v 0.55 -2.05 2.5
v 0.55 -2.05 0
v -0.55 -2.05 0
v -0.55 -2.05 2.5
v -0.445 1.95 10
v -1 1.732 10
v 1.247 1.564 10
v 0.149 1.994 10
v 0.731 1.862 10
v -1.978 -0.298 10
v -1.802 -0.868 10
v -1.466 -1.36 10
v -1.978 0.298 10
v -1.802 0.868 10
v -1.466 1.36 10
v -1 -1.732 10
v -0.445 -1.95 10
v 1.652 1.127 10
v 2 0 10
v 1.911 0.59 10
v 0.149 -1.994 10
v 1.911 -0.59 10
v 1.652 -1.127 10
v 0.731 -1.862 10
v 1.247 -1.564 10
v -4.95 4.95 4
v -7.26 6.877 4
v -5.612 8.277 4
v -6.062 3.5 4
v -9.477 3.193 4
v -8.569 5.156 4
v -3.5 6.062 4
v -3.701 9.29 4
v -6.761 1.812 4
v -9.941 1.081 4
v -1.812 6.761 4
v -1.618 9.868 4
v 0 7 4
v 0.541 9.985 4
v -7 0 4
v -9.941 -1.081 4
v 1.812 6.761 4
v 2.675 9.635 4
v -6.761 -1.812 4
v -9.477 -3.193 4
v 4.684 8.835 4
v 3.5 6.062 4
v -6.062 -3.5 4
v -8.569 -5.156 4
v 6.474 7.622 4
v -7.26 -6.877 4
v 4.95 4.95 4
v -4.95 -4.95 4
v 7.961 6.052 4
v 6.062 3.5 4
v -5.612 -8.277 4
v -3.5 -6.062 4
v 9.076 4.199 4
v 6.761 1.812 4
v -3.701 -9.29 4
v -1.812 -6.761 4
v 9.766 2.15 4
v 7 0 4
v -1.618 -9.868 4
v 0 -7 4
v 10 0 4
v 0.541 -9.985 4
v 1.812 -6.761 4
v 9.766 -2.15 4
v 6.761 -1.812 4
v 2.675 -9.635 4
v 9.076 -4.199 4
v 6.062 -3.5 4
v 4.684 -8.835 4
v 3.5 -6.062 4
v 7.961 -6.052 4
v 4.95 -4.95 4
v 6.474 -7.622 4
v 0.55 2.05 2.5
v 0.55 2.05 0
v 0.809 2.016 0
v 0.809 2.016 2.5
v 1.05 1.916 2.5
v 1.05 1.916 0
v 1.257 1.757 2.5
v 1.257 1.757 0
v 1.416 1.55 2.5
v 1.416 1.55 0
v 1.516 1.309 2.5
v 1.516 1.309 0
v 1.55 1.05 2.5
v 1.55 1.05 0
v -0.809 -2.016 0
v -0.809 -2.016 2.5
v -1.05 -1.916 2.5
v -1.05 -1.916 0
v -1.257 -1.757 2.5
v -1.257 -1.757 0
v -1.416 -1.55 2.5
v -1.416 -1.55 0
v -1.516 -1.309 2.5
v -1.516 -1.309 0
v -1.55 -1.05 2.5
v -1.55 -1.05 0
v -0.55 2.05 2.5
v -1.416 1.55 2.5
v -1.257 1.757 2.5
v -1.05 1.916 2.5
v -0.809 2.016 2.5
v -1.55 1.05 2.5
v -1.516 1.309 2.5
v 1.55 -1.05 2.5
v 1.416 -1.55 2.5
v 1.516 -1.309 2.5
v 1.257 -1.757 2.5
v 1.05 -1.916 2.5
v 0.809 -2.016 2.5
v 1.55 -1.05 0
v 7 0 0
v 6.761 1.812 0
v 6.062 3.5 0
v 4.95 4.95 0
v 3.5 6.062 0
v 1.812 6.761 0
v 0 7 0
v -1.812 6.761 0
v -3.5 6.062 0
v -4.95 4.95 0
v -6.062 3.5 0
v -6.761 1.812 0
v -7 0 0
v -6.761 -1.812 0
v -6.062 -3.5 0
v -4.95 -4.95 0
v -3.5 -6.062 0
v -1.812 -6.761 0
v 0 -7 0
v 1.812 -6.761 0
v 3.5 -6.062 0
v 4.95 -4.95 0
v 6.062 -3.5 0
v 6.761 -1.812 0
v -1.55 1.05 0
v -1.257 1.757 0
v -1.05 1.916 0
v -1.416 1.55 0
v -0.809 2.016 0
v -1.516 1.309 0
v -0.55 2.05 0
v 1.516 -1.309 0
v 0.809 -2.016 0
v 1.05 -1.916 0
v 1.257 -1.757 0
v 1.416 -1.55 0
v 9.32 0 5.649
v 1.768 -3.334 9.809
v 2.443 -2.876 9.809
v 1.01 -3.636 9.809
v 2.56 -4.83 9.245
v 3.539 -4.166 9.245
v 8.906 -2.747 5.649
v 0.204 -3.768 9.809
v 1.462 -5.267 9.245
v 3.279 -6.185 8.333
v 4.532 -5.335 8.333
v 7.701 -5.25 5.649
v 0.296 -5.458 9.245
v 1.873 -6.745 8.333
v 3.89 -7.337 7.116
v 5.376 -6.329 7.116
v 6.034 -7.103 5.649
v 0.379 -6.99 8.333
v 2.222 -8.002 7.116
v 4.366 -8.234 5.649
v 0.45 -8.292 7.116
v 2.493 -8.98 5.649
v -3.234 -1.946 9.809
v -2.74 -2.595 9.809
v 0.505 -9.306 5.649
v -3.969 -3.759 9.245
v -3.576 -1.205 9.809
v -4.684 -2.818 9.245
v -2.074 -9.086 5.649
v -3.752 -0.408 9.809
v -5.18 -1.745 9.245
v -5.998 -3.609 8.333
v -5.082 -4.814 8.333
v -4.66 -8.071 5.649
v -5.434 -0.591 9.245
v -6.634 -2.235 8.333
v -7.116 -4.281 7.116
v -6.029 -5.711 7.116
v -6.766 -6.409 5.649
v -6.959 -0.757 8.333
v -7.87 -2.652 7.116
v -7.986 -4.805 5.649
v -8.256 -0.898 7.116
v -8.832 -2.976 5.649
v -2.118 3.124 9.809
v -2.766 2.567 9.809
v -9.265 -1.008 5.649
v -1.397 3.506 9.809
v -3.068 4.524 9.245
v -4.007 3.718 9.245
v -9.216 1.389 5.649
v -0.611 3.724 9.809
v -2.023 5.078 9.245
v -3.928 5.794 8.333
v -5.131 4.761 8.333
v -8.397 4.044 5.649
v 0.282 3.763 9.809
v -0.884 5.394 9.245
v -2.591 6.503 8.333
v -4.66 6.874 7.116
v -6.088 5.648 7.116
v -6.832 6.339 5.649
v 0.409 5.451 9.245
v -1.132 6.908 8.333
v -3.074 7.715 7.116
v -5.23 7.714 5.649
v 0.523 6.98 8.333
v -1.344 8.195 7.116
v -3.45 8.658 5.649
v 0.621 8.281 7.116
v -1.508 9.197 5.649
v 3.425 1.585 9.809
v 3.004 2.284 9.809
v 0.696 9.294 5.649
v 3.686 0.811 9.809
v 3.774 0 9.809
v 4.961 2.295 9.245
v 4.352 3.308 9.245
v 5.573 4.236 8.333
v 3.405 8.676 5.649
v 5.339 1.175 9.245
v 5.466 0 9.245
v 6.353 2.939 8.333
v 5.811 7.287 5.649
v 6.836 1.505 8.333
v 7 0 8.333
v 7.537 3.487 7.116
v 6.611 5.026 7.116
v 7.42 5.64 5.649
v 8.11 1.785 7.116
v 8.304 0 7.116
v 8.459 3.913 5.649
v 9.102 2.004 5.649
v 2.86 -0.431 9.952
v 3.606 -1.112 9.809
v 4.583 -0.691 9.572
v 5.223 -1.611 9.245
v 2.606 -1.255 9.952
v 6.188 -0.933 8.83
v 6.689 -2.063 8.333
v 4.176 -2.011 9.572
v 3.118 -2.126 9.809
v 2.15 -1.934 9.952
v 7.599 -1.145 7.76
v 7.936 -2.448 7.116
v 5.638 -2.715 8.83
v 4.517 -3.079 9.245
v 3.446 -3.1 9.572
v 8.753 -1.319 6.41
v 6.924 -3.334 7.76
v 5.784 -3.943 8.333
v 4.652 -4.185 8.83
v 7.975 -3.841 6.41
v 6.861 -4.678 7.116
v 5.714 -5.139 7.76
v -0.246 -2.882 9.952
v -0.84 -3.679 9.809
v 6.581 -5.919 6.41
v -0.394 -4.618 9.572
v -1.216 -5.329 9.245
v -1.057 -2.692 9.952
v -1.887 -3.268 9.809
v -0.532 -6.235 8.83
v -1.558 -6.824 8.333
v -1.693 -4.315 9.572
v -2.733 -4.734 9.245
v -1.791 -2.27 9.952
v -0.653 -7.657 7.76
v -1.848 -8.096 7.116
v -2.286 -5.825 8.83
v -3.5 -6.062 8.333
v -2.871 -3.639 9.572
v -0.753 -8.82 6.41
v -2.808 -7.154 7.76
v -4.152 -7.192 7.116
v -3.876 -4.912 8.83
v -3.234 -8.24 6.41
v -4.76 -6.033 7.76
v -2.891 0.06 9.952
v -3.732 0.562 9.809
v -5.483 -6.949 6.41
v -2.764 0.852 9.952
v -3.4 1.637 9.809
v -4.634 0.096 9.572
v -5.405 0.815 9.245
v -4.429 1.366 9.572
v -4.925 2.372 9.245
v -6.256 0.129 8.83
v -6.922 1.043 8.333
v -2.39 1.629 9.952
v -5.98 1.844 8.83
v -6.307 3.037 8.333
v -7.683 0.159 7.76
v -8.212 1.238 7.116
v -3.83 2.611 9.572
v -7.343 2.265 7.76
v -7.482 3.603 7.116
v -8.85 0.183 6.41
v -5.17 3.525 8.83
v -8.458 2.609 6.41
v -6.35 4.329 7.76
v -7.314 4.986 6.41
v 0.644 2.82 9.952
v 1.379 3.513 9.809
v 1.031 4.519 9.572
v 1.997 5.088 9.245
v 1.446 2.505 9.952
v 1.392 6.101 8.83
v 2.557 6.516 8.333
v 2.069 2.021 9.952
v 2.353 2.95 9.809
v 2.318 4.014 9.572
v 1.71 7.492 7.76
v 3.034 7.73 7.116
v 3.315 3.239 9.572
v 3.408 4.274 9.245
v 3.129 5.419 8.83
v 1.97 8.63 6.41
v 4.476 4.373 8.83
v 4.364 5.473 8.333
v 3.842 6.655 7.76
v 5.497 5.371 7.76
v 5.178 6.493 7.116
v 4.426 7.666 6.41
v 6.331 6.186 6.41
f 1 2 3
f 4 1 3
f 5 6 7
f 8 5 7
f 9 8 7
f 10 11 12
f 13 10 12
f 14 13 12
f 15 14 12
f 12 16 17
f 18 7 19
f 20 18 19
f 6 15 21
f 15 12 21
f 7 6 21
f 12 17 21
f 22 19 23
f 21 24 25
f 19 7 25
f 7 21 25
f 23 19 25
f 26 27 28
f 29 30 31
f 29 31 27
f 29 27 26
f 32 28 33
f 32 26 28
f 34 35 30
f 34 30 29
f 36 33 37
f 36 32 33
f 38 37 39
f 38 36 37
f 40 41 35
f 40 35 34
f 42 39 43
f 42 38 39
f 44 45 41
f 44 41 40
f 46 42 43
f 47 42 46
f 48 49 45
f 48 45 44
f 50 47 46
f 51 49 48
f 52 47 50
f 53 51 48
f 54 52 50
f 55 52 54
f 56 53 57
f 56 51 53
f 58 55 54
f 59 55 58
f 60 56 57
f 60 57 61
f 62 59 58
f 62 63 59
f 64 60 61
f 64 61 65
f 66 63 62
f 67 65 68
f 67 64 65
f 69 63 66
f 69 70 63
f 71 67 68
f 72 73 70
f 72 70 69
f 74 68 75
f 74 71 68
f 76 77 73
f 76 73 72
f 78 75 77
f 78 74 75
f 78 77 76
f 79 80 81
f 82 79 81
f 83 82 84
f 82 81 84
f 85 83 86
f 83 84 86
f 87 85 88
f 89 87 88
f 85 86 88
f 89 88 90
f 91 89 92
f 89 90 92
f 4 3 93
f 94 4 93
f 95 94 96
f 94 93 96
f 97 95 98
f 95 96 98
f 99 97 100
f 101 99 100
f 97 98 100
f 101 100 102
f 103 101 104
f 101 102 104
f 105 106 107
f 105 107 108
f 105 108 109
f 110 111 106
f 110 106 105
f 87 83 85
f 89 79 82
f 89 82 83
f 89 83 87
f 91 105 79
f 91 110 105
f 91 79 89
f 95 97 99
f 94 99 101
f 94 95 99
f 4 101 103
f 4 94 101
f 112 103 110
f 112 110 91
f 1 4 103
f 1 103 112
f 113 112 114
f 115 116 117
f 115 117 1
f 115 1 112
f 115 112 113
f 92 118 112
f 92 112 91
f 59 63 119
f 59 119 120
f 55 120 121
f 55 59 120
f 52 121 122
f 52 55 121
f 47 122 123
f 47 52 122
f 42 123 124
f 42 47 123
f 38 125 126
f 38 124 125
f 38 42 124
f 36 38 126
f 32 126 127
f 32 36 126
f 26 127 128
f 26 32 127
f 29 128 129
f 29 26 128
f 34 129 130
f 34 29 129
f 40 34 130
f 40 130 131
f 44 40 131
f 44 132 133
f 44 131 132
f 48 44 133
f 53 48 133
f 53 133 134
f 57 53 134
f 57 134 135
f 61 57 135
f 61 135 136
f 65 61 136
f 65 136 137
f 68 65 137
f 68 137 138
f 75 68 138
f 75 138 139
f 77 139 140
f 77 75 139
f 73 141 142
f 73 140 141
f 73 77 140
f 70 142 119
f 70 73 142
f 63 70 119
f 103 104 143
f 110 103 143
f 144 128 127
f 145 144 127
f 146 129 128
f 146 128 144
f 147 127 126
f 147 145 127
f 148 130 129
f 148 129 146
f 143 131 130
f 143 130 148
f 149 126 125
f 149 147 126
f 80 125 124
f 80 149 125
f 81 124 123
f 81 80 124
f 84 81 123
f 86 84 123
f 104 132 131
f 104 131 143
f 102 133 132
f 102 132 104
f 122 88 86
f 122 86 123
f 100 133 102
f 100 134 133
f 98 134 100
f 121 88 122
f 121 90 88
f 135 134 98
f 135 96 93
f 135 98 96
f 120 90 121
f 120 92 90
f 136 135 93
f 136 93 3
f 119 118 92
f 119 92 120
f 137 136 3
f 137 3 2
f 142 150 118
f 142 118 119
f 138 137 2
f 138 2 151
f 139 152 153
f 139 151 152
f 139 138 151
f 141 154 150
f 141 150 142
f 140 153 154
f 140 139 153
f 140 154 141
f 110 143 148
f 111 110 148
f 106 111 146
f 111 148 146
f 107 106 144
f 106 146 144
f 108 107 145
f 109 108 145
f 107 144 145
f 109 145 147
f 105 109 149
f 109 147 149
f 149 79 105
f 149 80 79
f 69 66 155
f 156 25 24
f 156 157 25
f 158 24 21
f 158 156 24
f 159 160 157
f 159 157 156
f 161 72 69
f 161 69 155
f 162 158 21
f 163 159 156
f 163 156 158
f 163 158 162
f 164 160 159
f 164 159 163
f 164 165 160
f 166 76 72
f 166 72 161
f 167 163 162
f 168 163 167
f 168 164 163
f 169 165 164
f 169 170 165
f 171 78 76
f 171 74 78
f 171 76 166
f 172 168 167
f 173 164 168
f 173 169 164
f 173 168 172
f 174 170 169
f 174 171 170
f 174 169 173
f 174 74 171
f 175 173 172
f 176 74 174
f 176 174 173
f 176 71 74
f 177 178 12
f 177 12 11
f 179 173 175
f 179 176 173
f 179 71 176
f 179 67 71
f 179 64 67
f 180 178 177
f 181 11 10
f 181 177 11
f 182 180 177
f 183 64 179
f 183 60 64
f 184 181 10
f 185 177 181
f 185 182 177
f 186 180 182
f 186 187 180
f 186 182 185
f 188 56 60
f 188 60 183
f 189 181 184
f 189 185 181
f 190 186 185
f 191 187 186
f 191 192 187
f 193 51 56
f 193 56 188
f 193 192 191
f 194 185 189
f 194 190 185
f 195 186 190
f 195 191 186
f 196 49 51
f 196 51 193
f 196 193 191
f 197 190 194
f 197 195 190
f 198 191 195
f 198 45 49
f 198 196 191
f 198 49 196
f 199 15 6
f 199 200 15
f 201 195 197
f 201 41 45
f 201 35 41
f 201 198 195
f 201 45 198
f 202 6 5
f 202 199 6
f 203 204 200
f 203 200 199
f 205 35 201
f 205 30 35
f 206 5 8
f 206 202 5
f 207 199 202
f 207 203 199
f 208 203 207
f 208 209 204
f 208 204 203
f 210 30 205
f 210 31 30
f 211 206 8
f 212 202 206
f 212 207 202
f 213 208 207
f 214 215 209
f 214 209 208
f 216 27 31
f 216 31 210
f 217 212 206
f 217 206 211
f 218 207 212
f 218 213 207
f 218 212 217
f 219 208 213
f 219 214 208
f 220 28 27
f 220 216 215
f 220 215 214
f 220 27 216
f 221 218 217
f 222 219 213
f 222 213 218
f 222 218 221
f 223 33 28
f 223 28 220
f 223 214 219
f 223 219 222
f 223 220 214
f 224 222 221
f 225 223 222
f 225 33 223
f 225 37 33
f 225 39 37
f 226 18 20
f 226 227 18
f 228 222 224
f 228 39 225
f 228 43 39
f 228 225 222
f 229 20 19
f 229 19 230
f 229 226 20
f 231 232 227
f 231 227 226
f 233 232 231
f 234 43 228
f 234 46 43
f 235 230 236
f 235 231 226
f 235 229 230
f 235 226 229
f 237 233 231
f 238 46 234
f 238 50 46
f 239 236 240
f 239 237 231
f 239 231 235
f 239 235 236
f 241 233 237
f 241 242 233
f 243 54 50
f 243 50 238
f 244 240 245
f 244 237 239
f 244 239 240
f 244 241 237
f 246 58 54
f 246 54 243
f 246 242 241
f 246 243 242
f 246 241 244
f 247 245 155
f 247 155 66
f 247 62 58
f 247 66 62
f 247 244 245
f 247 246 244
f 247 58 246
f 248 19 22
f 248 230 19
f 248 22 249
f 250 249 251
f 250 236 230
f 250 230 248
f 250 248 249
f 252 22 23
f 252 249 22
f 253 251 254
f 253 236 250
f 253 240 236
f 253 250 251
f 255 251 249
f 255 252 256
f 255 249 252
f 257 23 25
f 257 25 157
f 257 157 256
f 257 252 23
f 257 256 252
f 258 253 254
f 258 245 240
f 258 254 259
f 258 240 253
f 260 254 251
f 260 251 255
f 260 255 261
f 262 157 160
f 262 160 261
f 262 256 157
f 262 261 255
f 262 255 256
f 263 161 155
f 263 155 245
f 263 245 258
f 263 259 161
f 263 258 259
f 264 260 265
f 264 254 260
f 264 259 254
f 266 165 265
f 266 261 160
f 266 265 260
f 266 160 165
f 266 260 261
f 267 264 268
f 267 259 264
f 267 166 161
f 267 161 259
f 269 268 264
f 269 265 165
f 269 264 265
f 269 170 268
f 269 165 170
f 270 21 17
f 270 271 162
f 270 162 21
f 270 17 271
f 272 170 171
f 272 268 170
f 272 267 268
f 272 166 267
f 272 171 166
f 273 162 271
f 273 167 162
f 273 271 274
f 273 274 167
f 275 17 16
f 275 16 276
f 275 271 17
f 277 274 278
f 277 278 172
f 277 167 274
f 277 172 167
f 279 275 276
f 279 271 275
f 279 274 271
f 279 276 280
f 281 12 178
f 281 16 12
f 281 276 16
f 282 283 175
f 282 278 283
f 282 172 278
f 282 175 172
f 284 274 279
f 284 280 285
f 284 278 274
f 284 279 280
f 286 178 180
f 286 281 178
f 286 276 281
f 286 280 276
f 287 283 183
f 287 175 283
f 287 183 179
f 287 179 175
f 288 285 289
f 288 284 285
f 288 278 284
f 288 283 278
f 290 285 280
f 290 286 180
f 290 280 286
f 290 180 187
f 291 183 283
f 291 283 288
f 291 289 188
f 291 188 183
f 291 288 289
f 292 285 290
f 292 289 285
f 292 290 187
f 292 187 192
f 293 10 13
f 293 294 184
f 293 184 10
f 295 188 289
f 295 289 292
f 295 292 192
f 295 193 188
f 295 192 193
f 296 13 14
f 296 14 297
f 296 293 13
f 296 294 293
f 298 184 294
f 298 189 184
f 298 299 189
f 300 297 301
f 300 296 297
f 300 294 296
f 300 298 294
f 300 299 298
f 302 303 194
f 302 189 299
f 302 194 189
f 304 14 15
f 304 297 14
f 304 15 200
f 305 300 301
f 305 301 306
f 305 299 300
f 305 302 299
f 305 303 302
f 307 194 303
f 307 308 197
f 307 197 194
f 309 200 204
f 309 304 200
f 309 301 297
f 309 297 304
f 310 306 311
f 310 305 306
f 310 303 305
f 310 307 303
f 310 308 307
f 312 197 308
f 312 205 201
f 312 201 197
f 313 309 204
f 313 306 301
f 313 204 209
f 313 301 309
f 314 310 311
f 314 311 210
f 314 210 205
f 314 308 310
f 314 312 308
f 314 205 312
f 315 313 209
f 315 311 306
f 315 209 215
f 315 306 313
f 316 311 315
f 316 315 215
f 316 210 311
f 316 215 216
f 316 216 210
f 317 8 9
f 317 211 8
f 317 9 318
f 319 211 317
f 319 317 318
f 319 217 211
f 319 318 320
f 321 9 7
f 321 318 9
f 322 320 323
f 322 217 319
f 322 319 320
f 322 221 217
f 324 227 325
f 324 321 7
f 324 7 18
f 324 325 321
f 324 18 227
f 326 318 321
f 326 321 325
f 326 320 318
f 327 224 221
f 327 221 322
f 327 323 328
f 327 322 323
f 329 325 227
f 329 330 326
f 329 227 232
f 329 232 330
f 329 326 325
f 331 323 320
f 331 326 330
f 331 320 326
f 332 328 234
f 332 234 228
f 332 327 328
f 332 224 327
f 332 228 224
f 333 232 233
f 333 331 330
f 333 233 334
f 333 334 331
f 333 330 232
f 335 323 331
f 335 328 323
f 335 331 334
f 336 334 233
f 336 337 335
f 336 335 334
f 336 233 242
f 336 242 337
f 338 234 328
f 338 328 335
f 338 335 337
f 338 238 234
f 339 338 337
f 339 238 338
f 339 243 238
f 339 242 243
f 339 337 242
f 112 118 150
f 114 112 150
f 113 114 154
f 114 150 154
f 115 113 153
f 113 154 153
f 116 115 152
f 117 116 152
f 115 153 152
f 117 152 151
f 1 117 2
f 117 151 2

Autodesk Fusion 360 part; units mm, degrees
sketch "Sketch1" plane through (0, 0, 0) normal (0, 1, 0) x (1, 0, 0)
  line L0 (0, 0) -> (7, 0)
  line L1 (7, 0) -> (7, -4)
  line L2 (7, -4) -> (10, -4)
  line L3 (0, -10) -> (0, 0)
  line L4 (0, -10) -> (2, -10)
  arc A0 (2, -10) -> (10, -4) centre (2, -1.6667) ccw
  dimension "d1" = 7
  dimension "d2" = 4
  dimension "d3" = 3
  dimension "d4" = 2
  dimension "d5" = 10
revolve "Revolve1" add sketch "Sketch1" angle 360 about axis through (0, 0, 10) along (0, 0, -1)
sketch "Sketch2" plane through (0, 0, 0) normal (0, 0, -1) x (1, 0, 0)
  circle A0 centre (0, 0) radius 7
  line L0 (1.55, 1.05) -> (1.55, -1.05)
  line L1 (-1.55, 1.05) -> (-1.55, -1.05)
  line L2 (0.55, -2.05) -> (-0.55, -2.05)
  line L3 (0.55, 2.05) -> (-0.55, 2.05)
  arc A1 (0.55, -2.05) -> (1.55, -1.05) centre (0.55, -1.05) ccw
  arc A2 (-0.55, 2.05) -> (-1.55, 1.05) centre (-0.55, 1.05) ccw
  arc A3 (-1.55, -1.05) -> (-0.55, -2.05) centre (-0.55, -1.05) ccw
  arc A4 (1.55, 1.05) -> (0.55, 2.05) centre (0.55, 1.05) ccw
  point P0 (0, -2.05)
  point P1 (1.55, 2.05)
  point P2 (1.55, -2.05)
  point P3 (1.55, 0)
  point P4 (-1.55, 2.05)
  dimension "d11" = 4.1
  dimension "d12" = 3.1
  dimension "d13" = 1
extrude "Extrude1" cut sketch "Sketch2" against normal blind 2.5 contours L0 L1 L2 L3 A1 A2 A3 A4
